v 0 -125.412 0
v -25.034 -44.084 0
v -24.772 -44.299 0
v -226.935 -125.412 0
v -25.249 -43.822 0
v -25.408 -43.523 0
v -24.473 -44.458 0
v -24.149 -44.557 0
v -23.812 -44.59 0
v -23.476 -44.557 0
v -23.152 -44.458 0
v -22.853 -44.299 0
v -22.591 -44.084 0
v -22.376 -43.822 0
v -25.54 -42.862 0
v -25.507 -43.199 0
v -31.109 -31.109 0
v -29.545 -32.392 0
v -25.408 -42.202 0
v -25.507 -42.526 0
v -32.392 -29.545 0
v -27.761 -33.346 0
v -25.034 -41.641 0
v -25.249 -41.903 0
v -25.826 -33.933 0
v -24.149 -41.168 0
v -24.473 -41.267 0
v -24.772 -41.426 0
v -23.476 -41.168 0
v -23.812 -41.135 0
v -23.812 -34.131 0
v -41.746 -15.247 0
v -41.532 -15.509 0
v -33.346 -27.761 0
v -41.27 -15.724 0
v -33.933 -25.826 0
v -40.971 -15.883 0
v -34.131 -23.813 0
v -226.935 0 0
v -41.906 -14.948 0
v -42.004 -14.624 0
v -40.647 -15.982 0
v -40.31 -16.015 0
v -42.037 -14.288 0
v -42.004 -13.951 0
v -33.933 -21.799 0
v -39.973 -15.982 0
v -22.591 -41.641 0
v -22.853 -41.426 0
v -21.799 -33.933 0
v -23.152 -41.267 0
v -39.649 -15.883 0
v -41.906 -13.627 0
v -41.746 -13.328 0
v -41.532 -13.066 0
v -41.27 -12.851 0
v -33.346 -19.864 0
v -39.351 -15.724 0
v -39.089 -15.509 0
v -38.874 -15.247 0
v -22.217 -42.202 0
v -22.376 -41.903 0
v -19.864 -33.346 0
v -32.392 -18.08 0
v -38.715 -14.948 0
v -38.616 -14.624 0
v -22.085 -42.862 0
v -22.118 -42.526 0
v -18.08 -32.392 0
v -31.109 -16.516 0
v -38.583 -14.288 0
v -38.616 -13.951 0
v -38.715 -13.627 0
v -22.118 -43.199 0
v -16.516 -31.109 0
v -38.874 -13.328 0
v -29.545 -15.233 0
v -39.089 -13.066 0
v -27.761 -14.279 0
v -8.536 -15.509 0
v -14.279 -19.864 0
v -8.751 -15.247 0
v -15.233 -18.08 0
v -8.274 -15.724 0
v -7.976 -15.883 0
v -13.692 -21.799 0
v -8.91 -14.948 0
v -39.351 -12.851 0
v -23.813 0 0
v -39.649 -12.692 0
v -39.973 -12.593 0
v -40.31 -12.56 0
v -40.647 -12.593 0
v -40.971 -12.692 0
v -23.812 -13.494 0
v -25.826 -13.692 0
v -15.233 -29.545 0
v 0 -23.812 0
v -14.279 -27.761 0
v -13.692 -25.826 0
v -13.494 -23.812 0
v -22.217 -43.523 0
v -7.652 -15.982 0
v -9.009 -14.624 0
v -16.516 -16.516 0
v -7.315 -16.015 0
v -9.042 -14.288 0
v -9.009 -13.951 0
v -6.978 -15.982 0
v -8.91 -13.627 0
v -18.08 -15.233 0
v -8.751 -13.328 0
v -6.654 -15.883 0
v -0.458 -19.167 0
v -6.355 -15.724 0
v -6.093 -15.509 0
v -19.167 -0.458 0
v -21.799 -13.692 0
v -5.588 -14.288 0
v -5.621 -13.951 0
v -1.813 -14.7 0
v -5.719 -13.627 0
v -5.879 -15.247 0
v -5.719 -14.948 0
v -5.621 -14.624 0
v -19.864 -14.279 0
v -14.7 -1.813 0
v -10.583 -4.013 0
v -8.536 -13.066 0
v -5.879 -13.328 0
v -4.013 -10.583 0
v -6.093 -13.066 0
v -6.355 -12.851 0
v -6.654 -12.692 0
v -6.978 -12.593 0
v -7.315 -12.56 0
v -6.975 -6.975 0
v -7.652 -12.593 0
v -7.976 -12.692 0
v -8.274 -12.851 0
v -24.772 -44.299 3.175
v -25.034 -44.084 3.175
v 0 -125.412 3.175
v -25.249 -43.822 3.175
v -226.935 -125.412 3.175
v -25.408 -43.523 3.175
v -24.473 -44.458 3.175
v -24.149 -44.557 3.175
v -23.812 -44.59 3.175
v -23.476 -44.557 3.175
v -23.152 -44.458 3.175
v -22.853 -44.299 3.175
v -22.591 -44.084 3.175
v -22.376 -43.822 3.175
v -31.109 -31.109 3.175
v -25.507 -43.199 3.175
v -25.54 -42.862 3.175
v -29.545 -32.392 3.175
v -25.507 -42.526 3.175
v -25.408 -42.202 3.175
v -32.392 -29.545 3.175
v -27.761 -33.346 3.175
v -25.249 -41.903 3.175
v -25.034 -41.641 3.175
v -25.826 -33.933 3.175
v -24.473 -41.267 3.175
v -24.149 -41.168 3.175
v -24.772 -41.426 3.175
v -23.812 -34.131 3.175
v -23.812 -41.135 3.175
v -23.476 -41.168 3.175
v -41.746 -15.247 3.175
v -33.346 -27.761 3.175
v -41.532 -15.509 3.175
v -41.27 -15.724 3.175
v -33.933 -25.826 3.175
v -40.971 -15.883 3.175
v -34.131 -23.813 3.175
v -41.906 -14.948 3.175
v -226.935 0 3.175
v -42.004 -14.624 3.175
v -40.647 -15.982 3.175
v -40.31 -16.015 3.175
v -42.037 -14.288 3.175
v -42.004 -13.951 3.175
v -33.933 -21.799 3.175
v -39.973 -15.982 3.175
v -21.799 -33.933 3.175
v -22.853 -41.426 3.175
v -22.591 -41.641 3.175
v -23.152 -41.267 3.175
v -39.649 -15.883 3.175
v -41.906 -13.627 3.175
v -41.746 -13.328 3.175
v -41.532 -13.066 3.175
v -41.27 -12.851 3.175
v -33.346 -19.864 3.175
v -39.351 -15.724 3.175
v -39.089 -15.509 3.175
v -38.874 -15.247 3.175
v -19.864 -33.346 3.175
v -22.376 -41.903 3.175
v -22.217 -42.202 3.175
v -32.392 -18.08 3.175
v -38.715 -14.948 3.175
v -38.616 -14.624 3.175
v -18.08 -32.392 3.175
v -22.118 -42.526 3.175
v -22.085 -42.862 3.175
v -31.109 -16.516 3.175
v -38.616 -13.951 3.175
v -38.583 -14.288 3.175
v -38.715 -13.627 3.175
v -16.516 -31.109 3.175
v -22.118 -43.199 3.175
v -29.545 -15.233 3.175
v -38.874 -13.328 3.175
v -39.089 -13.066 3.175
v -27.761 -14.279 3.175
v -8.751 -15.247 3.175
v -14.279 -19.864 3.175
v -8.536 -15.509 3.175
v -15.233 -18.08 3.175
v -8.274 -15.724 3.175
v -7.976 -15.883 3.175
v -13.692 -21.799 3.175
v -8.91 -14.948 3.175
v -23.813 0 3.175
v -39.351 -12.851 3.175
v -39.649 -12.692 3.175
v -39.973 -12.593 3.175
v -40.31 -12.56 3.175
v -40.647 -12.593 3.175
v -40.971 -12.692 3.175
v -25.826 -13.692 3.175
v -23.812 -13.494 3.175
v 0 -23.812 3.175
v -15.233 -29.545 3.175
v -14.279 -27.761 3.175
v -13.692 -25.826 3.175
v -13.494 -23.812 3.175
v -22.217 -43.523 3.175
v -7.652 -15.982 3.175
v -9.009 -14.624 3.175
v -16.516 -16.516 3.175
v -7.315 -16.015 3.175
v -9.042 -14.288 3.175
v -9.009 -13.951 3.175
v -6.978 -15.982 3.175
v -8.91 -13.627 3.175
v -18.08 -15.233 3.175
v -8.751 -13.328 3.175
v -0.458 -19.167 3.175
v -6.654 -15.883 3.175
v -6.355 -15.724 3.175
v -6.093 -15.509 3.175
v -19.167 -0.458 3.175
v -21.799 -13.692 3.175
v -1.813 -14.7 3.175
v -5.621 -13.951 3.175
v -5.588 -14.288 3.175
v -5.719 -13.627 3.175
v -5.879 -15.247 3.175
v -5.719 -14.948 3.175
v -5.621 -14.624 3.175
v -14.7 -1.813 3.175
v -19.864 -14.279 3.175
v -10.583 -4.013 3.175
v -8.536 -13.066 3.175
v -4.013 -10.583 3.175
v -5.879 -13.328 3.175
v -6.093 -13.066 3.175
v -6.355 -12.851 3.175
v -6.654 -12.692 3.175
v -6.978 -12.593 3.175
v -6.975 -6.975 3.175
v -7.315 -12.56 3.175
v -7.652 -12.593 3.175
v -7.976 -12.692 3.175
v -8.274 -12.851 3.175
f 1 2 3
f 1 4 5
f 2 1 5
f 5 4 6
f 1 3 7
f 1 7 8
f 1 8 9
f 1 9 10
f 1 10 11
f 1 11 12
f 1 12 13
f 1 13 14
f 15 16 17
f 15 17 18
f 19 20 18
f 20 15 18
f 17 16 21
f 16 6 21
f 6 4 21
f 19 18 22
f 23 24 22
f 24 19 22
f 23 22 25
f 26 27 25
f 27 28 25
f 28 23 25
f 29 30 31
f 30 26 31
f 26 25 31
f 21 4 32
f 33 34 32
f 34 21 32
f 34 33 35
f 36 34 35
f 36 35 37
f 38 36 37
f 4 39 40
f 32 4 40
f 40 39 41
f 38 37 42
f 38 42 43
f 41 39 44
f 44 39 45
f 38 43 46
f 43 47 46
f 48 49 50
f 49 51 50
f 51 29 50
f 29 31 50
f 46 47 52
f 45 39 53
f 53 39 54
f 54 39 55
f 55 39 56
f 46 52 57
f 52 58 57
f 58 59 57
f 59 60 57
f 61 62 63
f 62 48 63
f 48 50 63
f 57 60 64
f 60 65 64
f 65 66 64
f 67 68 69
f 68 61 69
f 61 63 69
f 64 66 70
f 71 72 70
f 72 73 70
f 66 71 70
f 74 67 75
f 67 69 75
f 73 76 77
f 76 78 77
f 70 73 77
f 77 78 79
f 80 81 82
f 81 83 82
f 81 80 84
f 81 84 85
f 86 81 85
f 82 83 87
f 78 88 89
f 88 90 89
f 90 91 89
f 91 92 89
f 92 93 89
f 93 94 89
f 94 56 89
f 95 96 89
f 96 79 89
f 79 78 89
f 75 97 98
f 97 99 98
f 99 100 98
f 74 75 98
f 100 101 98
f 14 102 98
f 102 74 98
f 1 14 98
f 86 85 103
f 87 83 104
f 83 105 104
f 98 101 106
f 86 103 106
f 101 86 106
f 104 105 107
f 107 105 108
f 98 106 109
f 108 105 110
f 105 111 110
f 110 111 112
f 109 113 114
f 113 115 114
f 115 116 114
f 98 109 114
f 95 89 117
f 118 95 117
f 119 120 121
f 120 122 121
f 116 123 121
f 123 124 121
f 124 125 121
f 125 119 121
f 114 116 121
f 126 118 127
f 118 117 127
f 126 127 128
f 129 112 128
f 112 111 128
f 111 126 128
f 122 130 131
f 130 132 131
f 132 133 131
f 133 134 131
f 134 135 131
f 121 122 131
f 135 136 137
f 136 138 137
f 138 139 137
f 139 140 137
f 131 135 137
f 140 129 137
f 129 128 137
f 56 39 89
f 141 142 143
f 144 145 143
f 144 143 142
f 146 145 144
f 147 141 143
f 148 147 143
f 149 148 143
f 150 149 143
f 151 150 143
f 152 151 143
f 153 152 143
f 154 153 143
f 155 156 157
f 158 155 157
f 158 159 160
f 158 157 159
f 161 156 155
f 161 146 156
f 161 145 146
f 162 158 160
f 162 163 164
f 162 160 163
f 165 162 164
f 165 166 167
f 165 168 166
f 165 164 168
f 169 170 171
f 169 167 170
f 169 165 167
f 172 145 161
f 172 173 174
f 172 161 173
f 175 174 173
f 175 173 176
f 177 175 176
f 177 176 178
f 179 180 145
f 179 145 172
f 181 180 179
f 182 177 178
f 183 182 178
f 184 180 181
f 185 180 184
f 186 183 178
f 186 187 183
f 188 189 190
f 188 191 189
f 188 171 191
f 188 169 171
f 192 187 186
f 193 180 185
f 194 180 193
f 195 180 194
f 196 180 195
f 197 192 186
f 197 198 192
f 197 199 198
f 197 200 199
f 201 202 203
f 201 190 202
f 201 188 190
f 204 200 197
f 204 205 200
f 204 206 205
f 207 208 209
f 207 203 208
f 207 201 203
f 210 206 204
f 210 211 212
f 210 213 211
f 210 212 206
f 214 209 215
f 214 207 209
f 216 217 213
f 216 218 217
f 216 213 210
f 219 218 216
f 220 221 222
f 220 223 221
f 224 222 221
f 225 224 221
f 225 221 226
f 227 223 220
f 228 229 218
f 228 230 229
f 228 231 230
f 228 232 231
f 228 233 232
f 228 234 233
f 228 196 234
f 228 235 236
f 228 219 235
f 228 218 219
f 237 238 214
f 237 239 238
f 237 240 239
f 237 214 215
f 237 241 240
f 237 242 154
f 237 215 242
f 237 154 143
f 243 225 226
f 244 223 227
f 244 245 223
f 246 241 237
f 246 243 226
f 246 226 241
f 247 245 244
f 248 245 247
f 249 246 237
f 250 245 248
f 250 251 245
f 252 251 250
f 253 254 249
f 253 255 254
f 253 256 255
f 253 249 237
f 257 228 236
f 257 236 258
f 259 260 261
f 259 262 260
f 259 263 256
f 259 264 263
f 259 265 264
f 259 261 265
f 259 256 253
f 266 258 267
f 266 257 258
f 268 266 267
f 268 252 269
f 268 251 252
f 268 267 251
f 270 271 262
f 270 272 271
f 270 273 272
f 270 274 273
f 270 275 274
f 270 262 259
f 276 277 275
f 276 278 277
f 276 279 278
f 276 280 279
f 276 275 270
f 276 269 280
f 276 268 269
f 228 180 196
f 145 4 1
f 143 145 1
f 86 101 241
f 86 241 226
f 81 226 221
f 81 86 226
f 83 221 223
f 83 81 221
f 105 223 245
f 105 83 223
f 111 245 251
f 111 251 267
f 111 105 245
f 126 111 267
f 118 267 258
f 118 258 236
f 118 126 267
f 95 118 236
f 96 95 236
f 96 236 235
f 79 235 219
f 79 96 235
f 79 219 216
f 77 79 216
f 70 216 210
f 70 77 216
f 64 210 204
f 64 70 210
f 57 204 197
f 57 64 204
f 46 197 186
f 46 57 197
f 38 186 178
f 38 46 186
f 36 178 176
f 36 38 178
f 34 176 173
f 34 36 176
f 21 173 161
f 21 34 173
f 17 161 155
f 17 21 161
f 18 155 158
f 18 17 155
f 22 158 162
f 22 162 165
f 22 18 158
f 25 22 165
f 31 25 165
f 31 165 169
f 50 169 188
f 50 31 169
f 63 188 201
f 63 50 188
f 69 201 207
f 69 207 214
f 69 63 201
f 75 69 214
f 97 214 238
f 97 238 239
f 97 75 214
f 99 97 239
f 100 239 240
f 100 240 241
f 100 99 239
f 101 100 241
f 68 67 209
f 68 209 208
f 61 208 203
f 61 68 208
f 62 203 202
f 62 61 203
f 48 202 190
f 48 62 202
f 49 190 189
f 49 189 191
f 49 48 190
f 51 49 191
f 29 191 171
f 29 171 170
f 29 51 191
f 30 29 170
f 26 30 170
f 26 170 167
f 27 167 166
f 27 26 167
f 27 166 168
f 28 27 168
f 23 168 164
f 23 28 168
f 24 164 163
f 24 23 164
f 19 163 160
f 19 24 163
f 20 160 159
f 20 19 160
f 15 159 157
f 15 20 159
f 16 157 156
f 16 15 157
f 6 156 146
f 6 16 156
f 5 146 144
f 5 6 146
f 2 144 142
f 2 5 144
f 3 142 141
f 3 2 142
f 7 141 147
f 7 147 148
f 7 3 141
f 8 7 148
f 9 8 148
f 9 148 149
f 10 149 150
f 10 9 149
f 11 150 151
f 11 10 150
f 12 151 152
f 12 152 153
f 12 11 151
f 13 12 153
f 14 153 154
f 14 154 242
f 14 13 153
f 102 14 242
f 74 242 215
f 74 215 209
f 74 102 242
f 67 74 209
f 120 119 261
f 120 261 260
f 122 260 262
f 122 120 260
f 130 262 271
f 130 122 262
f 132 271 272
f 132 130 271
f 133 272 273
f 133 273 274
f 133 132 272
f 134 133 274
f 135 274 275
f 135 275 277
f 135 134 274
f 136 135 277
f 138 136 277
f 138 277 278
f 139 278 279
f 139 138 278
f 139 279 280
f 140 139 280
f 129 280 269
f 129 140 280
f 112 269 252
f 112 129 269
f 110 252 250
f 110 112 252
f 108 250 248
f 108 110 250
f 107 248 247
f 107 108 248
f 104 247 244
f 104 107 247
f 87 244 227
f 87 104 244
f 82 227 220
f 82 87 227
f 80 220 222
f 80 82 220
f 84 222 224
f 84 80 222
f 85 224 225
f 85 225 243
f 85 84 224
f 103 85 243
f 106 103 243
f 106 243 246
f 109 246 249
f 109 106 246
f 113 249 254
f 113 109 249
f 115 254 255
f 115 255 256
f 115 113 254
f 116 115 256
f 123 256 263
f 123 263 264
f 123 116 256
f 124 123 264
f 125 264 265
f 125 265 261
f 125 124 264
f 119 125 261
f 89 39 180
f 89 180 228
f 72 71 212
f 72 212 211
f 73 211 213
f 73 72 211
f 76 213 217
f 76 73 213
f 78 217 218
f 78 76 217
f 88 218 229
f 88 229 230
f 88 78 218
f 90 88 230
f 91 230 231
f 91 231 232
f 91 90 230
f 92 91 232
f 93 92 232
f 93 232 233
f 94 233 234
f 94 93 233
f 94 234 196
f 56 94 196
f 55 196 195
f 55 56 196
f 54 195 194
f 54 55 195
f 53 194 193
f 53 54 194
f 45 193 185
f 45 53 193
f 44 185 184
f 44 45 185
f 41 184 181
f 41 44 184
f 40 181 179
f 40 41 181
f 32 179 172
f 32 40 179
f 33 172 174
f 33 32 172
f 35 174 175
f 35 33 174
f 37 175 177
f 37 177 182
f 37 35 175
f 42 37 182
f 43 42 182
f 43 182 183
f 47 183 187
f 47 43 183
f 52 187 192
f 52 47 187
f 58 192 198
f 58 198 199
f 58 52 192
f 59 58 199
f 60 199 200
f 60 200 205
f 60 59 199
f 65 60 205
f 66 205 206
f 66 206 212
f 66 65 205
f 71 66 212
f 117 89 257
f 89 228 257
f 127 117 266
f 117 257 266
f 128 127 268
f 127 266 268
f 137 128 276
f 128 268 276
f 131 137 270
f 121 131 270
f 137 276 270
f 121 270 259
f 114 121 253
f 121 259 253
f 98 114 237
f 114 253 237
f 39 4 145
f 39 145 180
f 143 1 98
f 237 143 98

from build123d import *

# Parameters (mm, degrees)
F0_W     = 226.934583
F0_H     = 125.4125
F0_R     = 1.7272
F0_R_2   = 10.31875
F1_DEPTH = 3.175
F2_R     = 23.8125


with BuildPart() as f1:
    # F0 (on Top) → F1 (new body)
    with BuildSketch(Plane.XY):
        with Locations((-113.467292, -62.70625)):
            Rectangle(F0_W, F0_H)
        with Locations((-23.8125, -42.8625)):
            Circle(F0_R, mode=Mode.SUBTRACT)
        with Locations((-23.8125, -23.8125)):
            Circle(F0_R_2, mode=Mode.SUBTRACT)
        with Locations((-40.310284, -14.2875)):
            Circle(F0_R, mode=Mode.SUBTRACT)
        with Locations((-7.314716, -14.2875)):
            Circle(F0_R, mode=Mode.SUBTRACT)
    extrude(amount=F1_DEPTH)

    # F2
    f2_edges = [f1.edges().sort_by_distance(p)[0] for p in [
        (0, 0, 1.5875),
    ]]
    fillet(f2_edges, radius=F2_R)


solid = f1.part
